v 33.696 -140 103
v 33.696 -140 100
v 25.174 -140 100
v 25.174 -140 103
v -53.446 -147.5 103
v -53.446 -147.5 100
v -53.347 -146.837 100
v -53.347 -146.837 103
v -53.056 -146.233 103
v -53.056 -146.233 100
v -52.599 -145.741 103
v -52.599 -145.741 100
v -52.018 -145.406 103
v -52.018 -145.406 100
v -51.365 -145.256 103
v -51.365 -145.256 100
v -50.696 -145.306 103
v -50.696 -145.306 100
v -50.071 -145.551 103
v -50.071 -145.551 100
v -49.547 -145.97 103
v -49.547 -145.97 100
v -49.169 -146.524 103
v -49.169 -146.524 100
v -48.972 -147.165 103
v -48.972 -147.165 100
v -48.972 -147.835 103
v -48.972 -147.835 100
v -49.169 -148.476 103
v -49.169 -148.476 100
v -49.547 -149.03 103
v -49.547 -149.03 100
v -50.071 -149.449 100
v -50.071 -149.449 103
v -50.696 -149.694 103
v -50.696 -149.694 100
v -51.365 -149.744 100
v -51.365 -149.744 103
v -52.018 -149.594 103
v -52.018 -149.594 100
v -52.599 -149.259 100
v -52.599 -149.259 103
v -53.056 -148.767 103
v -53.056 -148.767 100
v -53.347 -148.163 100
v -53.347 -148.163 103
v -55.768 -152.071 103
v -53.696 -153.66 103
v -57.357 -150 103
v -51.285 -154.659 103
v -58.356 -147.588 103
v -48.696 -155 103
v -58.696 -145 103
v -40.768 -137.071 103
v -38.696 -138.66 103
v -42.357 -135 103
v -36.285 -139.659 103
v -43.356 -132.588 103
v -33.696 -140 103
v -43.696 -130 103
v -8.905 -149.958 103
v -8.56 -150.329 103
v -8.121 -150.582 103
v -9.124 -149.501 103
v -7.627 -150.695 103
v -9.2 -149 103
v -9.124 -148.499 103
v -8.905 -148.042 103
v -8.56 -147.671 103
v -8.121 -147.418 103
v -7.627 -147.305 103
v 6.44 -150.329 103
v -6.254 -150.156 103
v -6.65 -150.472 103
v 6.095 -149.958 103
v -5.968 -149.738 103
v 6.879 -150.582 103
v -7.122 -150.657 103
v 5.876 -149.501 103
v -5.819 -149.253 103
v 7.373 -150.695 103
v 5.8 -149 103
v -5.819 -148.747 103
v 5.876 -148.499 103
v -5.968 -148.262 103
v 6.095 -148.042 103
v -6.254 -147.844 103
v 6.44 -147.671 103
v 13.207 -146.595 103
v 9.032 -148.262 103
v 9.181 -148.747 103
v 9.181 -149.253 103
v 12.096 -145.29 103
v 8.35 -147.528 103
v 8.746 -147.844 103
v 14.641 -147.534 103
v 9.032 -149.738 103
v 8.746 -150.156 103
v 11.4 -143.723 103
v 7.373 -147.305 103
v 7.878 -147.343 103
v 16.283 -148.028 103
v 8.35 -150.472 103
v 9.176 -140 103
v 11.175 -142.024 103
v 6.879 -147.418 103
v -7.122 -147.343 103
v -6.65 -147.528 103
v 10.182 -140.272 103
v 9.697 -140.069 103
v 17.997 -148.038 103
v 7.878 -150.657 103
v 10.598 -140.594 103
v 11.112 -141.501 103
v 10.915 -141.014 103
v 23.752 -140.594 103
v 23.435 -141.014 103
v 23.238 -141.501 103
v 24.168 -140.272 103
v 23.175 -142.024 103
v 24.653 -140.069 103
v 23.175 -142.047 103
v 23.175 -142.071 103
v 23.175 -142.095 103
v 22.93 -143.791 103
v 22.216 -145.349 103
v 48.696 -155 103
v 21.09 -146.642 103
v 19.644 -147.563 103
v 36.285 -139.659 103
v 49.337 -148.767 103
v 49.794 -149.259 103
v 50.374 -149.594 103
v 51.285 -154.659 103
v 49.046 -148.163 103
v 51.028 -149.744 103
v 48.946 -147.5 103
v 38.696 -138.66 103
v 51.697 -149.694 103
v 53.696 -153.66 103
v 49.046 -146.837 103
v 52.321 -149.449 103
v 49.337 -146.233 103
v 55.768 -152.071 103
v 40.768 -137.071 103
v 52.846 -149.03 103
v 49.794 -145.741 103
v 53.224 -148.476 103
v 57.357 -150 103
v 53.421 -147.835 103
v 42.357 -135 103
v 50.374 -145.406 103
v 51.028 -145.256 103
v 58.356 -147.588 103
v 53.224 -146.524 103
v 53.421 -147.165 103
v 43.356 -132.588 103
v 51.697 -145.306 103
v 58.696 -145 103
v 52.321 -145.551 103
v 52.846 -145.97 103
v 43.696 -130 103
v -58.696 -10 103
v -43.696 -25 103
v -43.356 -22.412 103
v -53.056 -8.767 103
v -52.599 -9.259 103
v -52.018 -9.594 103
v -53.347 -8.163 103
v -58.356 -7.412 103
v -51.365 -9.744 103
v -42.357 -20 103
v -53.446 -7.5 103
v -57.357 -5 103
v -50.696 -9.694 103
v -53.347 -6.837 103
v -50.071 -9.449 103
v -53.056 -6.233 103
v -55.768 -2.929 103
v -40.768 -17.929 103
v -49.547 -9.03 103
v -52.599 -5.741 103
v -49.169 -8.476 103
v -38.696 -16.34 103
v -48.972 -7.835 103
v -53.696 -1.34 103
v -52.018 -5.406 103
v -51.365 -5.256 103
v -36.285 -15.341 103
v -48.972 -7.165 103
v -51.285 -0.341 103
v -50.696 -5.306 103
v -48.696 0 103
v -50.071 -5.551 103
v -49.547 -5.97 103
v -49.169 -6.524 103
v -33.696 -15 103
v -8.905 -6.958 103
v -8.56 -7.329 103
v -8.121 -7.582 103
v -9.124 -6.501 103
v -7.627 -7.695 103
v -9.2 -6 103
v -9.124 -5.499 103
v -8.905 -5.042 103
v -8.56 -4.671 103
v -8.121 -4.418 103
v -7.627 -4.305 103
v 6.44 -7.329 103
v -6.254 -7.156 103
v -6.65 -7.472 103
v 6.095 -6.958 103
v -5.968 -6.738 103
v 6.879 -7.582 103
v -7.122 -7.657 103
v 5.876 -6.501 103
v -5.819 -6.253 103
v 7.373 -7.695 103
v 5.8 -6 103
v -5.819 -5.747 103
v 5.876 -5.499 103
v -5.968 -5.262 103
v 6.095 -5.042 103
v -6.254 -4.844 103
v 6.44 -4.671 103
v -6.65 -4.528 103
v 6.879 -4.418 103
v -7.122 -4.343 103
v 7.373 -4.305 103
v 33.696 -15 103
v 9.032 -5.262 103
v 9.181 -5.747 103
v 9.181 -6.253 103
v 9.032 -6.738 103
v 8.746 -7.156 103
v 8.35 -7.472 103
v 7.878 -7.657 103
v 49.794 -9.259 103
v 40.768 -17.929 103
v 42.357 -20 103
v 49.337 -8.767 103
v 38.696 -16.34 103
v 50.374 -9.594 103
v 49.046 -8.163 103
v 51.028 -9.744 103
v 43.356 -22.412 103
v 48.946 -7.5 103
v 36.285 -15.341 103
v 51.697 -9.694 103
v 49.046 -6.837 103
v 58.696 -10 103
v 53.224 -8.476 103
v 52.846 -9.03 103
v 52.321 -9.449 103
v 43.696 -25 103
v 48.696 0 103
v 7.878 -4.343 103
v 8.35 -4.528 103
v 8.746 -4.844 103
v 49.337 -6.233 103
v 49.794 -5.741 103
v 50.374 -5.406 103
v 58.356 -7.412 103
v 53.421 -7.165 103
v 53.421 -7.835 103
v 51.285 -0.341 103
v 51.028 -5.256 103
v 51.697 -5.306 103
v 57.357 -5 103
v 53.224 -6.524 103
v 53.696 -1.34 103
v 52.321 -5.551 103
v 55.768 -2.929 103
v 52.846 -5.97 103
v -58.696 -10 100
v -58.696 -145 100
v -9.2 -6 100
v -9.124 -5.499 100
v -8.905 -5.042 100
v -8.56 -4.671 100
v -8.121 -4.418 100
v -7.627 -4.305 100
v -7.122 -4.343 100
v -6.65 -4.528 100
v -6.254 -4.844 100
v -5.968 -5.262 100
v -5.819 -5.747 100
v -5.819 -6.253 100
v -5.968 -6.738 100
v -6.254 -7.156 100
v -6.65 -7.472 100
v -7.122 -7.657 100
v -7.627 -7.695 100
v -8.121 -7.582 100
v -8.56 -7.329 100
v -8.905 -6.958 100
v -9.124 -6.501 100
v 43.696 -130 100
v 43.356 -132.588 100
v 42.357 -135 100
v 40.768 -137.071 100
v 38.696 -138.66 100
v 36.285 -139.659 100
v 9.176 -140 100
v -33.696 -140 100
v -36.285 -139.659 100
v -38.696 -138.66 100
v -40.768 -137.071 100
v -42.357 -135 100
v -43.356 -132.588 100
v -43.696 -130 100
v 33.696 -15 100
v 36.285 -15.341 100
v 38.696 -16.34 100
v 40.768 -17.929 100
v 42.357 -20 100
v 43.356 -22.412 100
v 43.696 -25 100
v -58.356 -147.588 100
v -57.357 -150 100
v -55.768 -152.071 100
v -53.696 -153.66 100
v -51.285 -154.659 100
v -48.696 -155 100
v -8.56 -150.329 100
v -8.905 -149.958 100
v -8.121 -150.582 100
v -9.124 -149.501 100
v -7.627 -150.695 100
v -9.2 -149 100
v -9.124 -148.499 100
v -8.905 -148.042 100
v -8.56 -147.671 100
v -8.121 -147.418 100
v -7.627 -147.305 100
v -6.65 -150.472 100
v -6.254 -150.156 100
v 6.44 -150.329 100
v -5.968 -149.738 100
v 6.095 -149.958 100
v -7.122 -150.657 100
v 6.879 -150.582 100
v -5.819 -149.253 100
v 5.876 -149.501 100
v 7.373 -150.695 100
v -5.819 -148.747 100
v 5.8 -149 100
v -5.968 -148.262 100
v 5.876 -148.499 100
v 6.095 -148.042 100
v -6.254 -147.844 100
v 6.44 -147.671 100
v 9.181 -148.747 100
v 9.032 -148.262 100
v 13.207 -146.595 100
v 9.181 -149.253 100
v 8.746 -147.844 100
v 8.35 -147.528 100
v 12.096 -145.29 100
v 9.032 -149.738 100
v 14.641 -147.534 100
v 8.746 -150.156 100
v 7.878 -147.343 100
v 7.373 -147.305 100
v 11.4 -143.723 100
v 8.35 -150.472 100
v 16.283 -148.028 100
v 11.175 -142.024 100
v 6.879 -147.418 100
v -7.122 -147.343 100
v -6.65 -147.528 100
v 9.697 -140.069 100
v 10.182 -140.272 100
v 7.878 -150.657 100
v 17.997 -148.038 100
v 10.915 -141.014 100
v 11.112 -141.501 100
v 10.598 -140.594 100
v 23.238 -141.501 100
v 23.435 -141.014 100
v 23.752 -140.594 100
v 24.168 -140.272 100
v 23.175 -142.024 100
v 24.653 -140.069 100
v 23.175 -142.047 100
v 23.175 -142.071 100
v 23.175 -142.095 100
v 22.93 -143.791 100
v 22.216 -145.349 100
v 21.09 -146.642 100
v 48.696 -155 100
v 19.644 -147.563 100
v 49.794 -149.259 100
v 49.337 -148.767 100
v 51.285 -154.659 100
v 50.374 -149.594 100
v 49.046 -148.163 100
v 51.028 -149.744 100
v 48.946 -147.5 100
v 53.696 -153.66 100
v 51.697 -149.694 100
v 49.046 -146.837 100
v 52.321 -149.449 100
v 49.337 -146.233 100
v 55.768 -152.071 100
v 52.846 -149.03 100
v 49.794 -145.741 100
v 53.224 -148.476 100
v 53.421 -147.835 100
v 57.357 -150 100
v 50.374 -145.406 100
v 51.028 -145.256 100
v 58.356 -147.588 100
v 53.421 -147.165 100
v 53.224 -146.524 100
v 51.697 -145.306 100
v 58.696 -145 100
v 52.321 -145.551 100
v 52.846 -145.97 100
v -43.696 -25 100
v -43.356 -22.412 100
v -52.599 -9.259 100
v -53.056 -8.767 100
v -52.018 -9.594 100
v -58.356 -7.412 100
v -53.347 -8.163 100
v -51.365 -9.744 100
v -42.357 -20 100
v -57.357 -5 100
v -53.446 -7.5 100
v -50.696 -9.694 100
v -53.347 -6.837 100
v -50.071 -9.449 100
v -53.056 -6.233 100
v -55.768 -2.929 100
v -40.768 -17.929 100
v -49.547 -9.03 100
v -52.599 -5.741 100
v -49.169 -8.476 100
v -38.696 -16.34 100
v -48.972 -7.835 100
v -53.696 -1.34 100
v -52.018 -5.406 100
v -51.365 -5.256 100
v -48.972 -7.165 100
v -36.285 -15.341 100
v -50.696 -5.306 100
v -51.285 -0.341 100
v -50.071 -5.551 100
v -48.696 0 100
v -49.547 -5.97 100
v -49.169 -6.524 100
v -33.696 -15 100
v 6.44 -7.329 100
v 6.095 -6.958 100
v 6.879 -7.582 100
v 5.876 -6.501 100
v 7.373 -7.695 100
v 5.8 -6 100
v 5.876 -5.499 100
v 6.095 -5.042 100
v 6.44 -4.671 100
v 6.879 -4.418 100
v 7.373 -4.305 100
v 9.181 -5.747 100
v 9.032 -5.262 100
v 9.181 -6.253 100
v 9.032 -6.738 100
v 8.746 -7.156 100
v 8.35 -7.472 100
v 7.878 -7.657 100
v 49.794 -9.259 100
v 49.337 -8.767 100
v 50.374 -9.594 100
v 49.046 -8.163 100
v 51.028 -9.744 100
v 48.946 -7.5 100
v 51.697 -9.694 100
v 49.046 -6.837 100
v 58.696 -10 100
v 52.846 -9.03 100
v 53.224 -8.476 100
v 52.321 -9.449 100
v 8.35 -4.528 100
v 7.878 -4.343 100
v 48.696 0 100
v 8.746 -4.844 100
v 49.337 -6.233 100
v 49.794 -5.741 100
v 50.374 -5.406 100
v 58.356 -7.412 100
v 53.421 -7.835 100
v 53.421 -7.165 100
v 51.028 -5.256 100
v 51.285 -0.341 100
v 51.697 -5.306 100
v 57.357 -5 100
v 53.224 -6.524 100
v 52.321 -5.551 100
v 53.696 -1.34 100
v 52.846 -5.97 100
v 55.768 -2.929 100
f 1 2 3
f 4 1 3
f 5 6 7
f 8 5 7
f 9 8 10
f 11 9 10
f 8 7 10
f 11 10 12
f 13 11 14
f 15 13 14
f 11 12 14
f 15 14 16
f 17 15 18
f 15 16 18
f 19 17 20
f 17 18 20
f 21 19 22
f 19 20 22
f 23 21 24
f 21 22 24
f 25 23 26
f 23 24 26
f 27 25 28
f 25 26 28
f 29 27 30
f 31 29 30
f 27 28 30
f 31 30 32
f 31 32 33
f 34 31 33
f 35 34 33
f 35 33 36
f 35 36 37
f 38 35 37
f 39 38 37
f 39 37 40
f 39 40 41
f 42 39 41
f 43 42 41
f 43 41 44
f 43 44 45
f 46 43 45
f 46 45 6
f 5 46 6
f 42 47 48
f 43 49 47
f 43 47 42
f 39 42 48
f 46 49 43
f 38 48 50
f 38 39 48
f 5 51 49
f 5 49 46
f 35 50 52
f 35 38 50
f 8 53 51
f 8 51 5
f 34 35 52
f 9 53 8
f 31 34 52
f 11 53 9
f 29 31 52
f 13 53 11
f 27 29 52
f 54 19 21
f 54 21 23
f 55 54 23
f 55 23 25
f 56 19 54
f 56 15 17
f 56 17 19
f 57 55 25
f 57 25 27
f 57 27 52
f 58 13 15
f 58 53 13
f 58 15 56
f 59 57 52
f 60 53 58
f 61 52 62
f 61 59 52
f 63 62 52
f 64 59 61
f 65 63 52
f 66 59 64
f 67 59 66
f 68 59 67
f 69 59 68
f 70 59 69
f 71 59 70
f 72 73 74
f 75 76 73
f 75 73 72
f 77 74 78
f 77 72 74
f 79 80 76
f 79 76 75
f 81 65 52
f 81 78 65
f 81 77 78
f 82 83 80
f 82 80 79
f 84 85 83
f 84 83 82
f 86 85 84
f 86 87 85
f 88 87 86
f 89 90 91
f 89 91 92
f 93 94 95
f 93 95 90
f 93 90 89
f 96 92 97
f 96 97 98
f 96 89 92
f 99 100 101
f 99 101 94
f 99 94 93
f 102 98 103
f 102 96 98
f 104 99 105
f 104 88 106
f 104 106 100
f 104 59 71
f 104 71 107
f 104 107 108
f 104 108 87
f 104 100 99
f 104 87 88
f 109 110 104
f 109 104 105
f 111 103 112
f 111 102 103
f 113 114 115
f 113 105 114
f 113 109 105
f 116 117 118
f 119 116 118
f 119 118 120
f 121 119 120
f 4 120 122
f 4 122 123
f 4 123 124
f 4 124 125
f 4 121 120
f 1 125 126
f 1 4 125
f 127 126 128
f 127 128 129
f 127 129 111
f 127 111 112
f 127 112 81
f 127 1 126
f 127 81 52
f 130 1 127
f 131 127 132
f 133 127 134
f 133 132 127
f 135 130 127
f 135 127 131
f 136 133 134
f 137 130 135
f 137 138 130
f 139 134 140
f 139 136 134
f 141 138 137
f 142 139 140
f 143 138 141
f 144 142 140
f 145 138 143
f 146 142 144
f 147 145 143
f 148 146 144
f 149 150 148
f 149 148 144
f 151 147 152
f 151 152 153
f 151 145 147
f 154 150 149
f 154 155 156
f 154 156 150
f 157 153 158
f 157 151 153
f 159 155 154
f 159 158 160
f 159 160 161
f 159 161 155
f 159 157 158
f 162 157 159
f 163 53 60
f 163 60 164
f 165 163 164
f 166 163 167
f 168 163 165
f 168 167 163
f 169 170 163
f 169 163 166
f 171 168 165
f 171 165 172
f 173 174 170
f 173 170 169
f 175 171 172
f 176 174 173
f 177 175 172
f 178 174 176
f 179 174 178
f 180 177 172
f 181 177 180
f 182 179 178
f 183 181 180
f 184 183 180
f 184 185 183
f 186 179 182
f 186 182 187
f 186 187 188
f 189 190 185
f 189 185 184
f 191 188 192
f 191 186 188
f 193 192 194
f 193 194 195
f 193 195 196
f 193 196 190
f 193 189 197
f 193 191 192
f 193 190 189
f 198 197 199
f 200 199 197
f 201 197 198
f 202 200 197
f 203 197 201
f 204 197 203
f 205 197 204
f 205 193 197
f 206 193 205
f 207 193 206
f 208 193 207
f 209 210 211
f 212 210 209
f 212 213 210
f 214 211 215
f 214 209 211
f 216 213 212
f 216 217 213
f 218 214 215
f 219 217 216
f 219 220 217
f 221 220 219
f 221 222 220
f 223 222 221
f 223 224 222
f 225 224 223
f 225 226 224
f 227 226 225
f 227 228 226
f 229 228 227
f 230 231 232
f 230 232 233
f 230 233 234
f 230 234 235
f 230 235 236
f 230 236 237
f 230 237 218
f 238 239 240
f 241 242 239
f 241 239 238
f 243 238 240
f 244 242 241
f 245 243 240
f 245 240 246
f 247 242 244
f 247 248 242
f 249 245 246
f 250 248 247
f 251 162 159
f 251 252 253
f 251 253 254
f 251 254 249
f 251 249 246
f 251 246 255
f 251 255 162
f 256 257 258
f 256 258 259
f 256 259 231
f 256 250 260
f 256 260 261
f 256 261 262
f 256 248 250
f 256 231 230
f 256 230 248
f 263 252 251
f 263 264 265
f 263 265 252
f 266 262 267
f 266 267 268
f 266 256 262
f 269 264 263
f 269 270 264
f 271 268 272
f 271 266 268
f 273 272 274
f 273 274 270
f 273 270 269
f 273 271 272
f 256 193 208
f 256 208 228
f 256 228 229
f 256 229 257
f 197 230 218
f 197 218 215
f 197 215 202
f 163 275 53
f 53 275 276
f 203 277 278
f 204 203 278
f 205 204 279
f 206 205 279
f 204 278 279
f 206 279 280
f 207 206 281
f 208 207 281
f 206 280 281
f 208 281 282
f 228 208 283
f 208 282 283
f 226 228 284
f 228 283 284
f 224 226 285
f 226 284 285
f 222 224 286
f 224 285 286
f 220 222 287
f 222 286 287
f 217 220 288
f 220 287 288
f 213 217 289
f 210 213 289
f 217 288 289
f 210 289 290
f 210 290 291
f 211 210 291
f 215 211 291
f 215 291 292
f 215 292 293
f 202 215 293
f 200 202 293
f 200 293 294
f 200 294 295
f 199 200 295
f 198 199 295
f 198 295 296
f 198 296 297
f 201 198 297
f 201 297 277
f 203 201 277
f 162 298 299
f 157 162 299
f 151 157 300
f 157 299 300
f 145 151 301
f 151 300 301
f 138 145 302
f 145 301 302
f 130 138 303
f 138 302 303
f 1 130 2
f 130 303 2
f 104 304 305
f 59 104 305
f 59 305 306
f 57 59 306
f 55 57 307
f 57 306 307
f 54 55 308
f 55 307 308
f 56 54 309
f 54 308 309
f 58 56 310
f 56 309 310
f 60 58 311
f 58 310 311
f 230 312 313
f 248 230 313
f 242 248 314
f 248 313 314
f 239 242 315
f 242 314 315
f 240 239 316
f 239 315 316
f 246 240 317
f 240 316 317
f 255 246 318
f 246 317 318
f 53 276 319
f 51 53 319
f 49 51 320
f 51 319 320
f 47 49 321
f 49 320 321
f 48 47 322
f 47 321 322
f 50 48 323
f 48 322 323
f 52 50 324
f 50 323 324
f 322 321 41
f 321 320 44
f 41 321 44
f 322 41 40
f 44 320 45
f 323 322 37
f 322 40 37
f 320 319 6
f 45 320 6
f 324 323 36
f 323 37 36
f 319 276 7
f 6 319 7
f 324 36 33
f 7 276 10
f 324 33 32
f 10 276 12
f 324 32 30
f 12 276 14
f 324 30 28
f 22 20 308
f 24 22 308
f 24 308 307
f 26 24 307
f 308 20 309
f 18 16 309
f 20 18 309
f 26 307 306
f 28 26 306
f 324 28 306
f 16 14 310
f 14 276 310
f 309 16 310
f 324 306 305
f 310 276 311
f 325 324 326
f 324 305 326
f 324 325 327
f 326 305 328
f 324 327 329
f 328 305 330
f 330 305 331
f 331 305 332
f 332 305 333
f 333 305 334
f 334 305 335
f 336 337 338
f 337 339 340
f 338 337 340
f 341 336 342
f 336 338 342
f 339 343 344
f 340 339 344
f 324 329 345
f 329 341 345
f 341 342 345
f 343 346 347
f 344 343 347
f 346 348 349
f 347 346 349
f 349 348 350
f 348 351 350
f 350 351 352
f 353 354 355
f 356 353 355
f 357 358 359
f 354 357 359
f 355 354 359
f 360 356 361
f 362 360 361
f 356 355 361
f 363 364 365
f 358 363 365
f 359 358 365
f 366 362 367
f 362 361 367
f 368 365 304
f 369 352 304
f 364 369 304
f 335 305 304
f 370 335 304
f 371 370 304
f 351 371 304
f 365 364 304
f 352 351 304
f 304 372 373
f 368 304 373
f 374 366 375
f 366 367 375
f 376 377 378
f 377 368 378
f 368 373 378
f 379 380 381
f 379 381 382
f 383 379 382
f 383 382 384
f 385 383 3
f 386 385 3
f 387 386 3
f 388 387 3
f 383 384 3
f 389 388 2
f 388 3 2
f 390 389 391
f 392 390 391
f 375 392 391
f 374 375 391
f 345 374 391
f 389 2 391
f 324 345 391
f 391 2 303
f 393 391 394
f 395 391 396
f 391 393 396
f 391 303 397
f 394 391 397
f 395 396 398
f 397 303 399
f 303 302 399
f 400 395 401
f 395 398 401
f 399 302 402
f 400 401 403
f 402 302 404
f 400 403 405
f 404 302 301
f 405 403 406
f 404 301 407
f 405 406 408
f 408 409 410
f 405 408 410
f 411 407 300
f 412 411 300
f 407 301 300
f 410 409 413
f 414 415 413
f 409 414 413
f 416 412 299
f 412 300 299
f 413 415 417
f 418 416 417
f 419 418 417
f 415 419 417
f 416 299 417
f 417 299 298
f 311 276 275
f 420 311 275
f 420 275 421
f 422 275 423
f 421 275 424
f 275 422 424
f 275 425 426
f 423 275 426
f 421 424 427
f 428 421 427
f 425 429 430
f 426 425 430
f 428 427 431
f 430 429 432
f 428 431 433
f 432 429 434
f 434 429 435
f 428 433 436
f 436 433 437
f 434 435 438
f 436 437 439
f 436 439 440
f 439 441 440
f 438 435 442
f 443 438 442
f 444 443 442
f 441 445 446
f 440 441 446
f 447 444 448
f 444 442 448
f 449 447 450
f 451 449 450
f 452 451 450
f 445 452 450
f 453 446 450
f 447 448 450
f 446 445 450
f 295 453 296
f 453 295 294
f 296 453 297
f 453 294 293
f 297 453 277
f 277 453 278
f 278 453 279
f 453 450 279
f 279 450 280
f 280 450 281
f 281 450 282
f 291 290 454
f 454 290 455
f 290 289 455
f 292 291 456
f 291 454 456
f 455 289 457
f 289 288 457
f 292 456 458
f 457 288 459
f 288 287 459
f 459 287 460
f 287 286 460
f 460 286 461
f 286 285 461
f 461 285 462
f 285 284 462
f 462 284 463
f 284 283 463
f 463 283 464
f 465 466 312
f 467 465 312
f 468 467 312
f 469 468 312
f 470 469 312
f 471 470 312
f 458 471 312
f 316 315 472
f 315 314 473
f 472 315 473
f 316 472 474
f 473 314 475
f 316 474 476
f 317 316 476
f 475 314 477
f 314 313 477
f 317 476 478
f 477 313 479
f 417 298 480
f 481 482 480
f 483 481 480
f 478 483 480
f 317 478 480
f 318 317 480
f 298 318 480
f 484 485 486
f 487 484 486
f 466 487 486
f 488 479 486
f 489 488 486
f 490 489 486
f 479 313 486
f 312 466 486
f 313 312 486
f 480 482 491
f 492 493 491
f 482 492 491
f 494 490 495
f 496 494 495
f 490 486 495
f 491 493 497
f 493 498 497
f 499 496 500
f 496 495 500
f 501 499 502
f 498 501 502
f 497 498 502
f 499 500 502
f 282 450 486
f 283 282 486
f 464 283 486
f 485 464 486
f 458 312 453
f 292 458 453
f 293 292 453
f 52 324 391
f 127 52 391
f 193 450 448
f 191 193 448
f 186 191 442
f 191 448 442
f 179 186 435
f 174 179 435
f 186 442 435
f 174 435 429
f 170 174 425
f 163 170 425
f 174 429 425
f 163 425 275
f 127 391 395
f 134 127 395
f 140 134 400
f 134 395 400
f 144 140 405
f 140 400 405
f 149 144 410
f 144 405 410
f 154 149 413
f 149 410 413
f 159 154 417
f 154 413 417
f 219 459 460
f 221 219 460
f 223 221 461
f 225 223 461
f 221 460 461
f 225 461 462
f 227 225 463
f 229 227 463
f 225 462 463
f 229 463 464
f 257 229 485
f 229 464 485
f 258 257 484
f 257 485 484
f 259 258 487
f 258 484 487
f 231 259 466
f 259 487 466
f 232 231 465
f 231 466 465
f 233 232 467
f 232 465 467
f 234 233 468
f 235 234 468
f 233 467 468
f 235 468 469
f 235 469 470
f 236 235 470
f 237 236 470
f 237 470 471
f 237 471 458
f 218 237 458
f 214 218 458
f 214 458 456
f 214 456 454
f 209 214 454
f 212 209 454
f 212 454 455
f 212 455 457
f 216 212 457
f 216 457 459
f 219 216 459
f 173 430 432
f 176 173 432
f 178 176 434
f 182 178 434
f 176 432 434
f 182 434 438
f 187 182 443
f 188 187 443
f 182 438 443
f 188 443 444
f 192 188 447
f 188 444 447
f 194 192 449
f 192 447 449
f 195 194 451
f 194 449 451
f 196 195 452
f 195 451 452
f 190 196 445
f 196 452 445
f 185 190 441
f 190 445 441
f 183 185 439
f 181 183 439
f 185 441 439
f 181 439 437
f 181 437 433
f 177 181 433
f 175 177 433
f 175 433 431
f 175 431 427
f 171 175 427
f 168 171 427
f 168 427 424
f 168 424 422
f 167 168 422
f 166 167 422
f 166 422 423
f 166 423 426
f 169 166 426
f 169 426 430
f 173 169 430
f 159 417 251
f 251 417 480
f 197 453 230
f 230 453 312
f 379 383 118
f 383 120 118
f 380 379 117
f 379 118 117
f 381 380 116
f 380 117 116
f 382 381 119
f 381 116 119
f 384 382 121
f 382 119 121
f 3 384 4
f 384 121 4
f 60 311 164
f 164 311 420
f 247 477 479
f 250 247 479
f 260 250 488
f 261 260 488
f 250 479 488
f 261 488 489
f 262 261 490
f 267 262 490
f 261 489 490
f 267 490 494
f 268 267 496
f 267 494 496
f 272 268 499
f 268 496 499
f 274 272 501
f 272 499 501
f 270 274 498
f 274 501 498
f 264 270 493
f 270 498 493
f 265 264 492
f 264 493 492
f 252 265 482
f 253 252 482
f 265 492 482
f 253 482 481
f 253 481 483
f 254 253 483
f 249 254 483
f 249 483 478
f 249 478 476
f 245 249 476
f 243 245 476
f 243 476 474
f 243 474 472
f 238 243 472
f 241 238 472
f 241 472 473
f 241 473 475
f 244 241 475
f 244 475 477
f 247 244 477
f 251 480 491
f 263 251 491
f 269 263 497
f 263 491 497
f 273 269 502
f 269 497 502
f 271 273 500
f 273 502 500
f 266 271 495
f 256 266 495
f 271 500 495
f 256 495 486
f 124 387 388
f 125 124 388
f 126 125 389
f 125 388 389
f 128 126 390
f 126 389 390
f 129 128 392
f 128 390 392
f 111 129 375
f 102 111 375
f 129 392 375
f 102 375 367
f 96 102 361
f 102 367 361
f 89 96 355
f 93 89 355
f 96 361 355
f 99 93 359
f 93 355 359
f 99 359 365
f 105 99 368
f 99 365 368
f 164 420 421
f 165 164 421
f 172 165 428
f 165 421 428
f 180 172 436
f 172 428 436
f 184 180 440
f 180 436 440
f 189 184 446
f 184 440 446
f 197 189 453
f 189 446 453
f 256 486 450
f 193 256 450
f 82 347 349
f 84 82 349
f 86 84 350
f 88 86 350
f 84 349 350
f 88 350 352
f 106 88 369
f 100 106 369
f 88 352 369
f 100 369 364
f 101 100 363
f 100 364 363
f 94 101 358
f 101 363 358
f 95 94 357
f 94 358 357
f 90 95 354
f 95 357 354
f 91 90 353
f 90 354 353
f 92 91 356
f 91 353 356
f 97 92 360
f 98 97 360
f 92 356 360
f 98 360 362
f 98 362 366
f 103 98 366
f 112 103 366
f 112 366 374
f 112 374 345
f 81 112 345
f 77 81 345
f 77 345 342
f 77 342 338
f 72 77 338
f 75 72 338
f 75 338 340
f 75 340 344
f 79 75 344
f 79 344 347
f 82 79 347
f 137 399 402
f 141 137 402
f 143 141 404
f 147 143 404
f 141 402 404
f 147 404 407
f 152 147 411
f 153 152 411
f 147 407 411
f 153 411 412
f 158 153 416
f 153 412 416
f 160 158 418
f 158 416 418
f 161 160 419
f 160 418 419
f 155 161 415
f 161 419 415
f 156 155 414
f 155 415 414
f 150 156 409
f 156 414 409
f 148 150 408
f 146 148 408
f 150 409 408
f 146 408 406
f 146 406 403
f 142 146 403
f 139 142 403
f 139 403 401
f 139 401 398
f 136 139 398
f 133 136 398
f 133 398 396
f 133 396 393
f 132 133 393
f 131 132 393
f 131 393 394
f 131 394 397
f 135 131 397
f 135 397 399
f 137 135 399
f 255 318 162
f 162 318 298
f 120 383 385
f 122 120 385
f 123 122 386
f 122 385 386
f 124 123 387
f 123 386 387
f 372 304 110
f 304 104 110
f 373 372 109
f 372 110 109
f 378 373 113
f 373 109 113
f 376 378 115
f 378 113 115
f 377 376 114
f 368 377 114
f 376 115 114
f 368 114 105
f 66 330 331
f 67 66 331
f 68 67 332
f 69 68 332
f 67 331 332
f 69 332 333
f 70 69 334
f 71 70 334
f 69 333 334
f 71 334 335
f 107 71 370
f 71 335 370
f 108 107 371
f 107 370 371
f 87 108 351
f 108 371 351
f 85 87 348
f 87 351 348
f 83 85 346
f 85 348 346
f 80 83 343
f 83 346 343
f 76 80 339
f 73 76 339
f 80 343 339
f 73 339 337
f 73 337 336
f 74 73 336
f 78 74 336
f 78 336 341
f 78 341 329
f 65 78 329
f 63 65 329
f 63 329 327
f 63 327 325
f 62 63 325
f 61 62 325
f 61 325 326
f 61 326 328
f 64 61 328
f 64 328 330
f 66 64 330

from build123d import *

# Parameters (mm, degrees)
BOSS_EXTRU_1_START = 100
BOSS_EXTRU_1_DEPTH = 3
D_GAGEMENT_M41_D   = 4.5
CONG_1_R           = 2
D_GAGEMENT_M31_D   = 3.4


with BuildPart() as part:
    # Esquisse1 → Boss.-Extru.1 (new body)
    with BuildSketch(Plane.XY.offset(BOSS_EXTRU_1_START)):
        with BuildLine():
            ThreePointArc((-48.696481526, 0), (-55.767549338, -2.928932188), (-58.696481526, -10))
            Line((-58.696481526, -10), (-58.696481526, -145))
            ThreePointArc((-58.696481526, -145), (-55.767549338, -152.071067812), (-48.696481526, -155))
            Line((-48.696481526, -155), (48.696481526, -155))
            ThreePointArc((48.696481526, -155), (55.767549338, -152.071067812), (58.696481526, -145))
            Line((58.696481526, -145), (58.696481526, -10))
            ThreePointArc((58.696481526, -10), (55.767549338, -2.928932188), (48.696481526, 0))
            Line((48.696481526, 0), (-48.696481526, 0))
        make_face()
        with BuildLine():
            Line((-43.696481526, -130), (-43.696481526, -25))
            ThreePointArc((-43.696481526, -25), (-40.767549338, -17.928932188), (-33.696481526, -15))
            Line((-33.696481526, -15), (33.696481526, -15))
            ThreePointArc((33.696481526, -15), (40.767549338, -17.928932188), (43.696481526, -25))
            Line((43.696481526, -25), (43.696481526, -130))
            ThreePointArc((43.696481526, -130), (40.767549338, -137.071067812), (33.696481526, -140))
            Line((33.696481526, -140), (22.797478109, -140))
            ThreePointArc((22.797478109, -140), (23.07986531, -141.030472587), (23.175, -142.094693275))
            ThreePointArc((23.175, -142.094693275), (16.110779311, -147.999558585), (11.552521891, -140))
            Line((11.552521891, -140), (-33.696481526, -140))
            ThreePointArc((-33.696481526, -140), (-40.767549338, -137.071067812), (-43.696481526, -130))
        make_face(mode=Mode.SUBTRACT)
    extrude(amount=BOSS_EXTRU_1_DEPTH)

    # Dégagement M41 (through all)
    with Locations(Plane.XY.offset(103)):
        with Locations((-51.196481526, -7.5), (51.196481526, -7.5), (51.196481526, -147.5), (-51.196481526, -147.5)):
            Hole(D_GAGEMENT_M41_D / 2)

    # Congé1
    cong_1_edges = [part.edges().sort_by_distance(p)[0] for p in [
        (22.797478109, -140, 101.5),
        (11.552521891, -140, 101.5),
    ]]
    fillet(cong_1_edges, radius=CONG_1_R)

    # Dégagement M31 (through all)
    with Locations(Plane.XY.offset(103)):
        with Locations((-7.5, -6), (7.5, -6), (-7.5, -149), (7.5, -149)):
            Hole(D_GAGEMENT_M31_D / 2)


solid = part.part
